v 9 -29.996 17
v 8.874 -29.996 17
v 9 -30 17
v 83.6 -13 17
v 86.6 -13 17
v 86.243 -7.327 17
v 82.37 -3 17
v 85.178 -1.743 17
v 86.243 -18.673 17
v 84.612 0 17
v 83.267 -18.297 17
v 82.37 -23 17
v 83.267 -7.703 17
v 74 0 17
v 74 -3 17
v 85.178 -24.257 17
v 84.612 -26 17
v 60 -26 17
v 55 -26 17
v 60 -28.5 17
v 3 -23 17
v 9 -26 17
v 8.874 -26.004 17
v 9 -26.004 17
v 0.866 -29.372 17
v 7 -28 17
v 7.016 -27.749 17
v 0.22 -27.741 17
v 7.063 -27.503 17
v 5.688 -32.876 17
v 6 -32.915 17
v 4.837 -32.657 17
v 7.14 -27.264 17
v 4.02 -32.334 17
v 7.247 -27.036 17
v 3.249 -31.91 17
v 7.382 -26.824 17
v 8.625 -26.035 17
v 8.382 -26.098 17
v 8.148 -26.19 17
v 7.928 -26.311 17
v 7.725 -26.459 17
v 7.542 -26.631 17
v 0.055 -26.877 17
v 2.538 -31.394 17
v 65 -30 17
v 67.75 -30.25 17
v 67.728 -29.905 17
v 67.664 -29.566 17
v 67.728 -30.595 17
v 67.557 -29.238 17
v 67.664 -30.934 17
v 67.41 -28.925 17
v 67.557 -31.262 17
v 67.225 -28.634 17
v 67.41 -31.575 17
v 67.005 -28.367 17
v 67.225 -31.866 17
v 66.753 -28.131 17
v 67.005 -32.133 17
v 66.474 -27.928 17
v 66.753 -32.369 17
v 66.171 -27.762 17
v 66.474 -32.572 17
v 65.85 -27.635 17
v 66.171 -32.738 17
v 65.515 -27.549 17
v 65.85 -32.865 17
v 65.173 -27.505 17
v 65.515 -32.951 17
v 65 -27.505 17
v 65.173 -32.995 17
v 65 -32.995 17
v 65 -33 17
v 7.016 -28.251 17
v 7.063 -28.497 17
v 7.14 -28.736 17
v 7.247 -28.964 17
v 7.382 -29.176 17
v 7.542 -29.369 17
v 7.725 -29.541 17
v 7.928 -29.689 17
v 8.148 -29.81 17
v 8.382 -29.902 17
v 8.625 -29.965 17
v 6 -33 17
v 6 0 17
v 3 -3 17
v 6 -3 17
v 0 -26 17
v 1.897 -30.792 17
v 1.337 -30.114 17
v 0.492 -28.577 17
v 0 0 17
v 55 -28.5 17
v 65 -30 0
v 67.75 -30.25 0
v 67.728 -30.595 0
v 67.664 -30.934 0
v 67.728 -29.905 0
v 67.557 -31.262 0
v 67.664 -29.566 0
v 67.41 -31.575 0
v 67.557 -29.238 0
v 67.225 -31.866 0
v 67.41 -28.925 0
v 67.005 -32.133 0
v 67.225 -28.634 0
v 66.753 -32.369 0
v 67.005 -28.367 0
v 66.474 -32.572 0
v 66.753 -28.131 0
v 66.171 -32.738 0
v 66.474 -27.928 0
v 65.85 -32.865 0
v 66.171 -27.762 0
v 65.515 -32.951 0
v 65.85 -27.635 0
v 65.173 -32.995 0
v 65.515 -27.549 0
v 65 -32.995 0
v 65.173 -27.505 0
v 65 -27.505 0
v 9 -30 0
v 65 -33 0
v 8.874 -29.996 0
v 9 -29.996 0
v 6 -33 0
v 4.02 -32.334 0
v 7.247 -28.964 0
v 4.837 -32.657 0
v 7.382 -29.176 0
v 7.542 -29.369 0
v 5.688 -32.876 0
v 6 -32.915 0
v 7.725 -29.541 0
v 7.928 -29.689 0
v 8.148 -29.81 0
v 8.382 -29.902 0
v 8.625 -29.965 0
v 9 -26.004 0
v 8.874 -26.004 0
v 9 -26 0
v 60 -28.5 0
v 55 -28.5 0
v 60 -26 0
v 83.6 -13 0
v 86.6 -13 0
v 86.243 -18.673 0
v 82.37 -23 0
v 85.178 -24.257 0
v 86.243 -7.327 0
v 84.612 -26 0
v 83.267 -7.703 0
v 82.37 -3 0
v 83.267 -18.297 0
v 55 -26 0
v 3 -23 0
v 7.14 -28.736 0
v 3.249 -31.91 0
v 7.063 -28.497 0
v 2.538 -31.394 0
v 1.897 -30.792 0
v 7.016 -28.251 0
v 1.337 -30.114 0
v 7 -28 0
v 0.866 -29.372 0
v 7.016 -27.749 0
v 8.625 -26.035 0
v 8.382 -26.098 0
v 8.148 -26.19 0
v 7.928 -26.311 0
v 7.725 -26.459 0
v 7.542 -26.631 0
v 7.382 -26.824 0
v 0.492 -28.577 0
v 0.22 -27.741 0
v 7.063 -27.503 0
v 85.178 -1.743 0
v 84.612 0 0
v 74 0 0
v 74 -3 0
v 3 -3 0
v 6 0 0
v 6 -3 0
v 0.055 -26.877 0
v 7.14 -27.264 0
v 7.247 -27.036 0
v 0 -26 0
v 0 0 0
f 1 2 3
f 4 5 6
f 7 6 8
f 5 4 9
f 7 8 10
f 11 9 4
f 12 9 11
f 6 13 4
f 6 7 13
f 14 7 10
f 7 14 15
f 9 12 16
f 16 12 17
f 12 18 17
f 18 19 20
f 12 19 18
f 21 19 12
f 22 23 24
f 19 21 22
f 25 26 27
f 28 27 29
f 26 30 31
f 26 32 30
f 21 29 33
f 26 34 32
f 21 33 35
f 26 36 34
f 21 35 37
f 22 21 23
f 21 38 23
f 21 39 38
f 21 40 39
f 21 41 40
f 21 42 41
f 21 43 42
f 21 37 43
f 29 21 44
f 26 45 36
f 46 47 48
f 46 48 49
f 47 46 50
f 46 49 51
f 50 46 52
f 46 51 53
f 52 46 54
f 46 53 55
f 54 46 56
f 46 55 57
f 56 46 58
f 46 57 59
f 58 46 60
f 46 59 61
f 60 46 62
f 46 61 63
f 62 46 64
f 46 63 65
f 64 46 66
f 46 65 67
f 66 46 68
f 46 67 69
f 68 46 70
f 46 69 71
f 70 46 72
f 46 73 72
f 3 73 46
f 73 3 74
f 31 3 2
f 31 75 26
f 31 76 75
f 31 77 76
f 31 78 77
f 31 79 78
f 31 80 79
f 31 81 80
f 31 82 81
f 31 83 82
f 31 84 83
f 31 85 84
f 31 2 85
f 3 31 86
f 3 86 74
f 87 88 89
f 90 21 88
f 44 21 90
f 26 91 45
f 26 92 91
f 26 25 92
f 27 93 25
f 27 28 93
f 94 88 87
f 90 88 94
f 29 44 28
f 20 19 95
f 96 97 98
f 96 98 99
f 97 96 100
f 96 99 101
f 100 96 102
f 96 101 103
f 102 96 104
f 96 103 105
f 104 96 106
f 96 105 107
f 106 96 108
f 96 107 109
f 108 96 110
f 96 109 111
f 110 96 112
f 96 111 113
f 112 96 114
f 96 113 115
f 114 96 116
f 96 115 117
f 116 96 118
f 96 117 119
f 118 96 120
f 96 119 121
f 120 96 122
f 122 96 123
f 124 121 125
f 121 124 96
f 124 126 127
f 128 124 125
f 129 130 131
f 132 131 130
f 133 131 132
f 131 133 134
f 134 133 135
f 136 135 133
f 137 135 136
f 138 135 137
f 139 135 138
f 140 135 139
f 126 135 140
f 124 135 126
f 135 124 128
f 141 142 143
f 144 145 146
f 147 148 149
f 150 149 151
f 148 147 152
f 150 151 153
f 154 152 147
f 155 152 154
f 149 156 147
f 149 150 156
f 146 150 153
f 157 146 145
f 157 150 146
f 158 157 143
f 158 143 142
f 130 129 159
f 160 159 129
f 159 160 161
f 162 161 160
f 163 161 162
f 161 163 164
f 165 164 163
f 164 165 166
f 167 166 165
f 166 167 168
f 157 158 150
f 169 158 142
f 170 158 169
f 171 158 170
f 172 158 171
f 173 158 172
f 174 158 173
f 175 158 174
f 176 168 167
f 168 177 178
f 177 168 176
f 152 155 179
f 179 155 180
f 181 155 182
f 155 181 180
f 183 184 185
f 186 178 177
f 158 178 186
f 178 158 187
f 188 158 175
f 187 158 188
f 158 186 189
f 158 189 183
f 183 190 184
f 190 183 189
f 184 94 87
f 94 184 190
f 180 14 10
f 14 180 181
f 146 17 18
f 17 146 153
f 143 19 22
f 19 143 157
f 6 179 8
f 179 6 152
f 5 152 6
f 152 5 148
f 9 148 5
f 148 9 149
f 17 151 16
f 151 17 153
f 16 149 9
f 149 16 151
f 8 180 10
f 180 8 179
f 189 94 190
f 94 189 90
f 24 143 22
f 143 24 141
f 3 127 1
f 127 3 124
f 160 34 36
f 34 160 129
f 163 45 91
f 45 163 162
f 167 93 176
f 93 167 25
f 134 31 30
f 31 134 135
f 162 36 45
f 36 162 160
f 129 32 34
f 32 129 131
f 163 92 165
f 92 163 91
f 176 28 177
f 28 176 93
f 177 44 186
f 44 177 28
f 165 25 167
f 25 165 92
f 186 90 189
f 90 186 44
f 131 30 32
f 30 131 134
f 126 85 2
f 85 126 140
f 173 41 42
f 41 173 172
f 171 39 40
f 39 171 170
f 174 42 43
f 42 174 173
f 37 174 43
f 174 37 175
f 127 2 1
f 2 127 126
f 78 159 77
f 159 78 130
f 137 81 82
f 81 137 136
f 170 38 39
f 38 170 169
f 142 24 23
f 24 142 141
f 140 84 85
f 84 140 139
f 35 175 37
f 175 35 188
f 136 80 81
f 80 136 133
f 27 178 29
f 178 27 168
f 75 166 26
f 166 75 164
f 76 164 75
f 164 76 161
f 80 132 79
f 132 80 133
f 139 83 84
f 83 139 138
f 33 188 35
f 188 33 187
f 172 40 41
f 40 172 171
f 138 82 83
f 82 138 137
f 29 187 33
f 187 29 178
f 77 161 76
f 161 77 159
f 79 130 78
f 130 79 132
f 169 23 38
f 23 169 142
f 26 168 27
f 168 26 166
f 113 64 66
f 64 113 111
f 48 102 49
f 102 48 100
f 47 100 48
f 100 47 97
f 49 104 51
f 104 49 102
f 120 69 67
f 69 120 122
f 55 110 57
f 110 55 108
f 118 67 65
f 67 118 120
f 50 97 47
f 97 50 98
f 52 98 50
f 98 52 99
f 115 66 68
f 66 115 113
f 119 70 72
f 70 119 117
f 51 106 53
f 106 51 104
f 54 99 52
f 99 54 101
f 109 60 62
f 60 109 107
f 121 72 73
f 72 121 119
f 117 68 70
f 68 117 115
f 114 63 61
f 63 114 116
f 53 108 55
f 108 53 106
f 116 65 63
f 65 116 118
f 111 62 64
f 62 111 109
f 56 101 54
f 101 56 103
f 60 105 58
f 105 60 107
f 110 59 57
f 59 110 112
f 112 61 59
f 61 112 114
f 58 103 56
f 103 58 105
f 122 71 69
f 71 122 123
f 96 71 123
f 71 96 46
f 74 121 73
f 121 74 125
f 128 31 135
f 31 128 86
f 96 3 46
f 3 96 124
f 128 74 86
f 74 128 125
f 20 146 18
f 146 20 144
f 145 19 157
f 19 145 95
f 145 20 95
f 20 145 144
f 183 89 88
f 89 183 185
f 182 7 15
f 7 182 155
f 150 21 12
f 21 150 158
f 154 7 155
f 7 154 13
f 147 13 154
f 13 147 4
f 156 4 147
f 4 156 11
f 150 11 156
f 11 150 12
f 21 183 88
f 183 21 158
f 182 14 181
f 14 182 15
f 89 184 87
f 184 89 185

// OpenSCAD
/* [insulin pump clip] */

$fn=50;

pump_length=80.6; // [75:80]
pump_depth = 20;

// at the bottom of the pump what is the difference in length between the longest and shortest part?
curve_diff = 1.2; // [1:2]


clip_top_claw=3.0;
clip_opening_length=68.0;

hook_depth=7.0;
hook_length=70.0;
nubbin_depth=2.5;
nubbin_length=5.0;

wall_thickness=3.0;

// clip_width
clip_width = 17.0; // [2:25]


pump_bottom_radius = (pow(curve_diff,2) + pow((pump_depth/2),2))/(2*curve_diff);

difference(){

// the clip ready for removal of the pump cutout and opening
union(){

//create main pump clip part and move it to origin
translate([pump_length+wall_thickness-pump_bottom_radius,-(pump_depth+(2*wall_thickness))/2.0,0 ]){
  intersection(){
    translate([0,-(pump_depth+(2*wall_thickness))/2.0,0]){
      cube([pump_bottom_radius+wall_thickness, pump_depth+(2*wall_thickness), clip_width]);
    }
    cylinder(r=pump_bottom_radius+wall_thickness, h=clip_width);
  }
  translate([-(pump_length+wall_thickness-pump_bottom_radius), -(pump_depth+(2*wall_thickness))/2.0, 0]){
    cube([pump_length+wall_thickness-pump_bottom_radius, pump_depth+(2*wall_thickness), clip_width]);
  }
}

// create hook
translate([0,-(pump_depth+(2*wall_thickness)),0]){
  translate([0,-hook_depth,0]){
    difference(){
      intersection(){
        cube([wall_thickness*3,hook_depth,clip_width]);
        translate([hook_depth, hook_depth, 0]){
          cylinder(r=hook_depth, h=clip_width);
        }
      }
      translate([wall_thickness*3, wall_thickness+((hook_depth-wall_thickness)/2),0]){
        cylinder(d=hook_depth-wall_thickness, h=clip_width);
      }
    }
    translate([wall_thickness*2,0,0]){
      cube([hook_length-nubbin_length-(wall_thickness*2), wall_thickness, clip_width]);
    }
    translate([hook_length-nubbin_length, 0,0]){
      intersection(){
        translate([0,(nubbin_depth+wall_thickness)/2,0]){
          cylinder(d=nubbin_depth+wall_thickness, h=clip_width);
        }
        cube([nubbin_length, nubbin_depth+wall_thickness, clip_width]);
      }
    }
    translate([hook_length-(3*nubbin_length), hook_depth-nubbin_depth, 0]){
      cube([nubbin_length, nubbin_depth, clip_width]);
    }
  }
}

}

// pump moved to the correct location
translate([wall_thickness, -(pump_depth+wall_thickness),0]){
  // pump
  #cube([pump_length-pump_bottom_radius+0.1, pump_depth, clip_width]);
    translate([pump_length-pump_bottom_radius,0,0]){
    intersection(){
      cube([pump_bottom_radius, pump_depth, clip_width]);
      translate([0,pump_depth/2,0]){
        cylinder(r=pump_bottom_radius, h=clip_width);
      }
    }
  }
}

// opening moved to the correct location
translate([wall_thickness+clip_top_claw, -wall_thickness, 0]){
  //opening
  cube(clip_opening_length, wall_thickness, clip_width);
}
}
